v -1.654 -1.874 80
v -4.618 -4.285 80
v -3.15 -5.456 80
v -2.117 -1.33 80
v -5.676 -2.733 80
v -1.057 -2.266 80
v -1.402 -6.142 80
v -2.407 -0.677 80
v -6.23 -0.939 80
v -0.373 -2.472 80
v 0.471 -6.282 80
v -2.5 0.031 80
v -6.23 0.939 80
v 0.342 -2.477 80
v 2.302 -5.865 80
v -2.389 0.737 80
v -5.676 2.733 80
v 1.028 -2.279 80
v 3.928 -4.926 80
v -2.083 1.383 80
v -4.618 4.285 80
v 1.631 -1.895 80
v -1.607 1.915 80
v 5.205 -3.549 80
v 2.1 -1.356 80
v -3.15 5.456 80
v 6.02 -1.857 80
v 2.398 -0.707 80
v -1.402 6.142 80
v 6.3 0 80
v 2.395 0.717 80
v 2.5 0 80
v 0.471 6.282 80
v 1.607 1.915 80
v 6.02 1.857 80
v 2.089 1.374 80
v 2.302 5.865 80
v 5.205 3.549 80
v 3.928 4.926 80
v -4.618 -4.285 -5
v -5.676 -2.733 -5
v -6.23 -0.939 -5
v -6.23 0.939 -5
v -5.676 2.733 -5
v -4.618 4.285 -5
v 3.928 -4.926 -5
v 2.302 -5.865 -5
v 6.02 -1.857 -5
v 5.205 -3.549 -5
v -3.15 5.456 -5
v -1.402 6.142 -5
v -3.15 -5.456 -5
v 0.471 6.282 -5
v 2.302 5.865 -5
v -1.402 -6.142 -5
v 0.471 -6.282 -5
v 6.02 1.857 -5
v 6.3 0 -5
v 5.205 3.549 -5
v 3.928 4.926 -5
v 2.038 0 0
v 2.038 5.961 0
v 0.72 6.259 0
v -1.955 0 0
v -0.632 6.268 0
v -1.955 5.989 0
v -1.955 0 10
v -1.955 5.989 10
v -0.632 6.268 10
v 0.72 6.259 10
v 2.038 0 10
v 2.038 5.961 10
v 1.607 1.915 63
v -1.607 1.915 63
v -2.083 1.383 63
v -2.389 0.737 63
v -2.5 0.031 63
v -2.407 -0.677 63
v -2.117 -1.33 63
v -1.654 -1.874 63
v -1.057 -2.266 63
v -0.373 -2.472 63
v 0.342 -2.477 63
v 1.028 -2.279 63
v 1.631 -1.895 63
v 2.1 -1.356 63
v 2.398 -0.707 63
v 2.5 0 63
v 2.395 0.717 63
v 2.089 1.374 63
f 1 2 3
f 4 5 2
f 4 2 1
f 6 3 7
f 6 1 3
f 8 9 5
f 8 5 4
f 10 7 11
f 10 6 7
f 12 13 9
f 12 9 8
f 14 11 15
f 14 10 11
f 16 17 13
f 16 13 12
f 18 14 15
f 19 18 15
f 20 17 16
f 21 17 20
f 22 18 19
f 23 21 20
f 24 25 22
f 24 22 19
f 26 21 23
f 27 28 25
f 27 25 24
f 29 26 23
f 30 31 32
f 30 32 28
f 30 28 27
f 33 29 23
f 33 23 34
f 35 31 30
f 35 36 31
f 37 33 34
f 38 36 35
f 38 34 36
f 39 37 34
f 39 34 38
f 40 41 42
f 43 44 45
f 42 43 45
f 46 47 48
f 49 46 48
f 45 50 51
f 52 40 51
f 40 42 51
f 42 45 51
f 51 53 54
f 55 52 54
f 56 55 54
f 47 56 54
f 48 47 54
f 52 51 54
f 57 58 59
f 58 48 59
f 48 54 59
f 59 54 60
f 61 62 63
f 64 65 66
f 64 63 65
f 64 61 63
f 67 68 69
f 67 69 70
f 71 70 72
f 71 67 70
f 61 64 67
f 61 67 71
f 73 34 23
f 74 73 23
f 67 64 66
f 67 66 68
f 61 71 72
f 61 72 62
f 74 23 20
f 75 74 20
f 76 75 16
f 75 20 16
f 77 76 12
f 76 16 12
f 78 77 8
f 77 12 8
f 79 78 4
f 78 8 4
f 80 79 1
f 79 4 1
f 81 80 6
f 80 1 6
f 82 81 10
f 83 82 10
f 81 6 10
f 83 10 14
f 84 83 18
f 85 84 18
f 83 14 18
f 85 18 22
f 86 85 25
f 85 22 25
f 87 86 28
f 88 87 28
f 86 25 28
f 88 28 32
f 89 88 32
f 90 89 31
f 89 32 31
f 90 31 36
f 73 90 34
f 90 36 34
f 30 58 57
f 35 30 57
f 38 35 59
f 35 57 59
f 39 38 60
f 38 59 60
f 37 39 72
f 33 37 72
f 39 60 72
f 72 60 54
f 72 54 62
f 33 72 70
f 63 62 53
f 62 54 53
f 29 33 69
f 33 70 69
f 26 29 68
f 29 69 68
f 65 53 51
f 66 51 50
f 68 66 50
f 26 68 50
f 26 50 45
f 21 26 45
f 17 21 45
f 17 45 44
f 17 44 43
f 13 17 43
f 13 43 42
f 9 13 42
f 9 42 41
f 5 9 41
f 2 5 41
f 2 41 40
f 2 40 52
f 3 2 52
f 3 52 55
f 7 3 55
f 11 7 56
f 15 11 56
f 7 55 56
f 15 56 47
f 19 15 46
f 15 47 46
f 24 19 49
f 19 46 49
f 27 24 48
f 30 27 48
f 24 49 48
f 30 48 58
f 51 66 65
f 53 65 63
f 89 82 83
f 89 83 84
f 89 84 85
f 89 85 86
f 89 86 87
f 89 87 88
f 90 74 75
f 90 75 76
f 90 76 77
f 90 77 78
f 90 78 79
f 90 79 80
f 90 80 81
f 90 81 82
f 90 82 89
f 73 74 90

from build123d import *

# Parameters (mm, degrees)
BOSS_EXTRUDE1_DEPTH      = 80
BOSS_EXTRUDE1_DEPTH_BACK = 5
SKETCH1_R                = 6.3
CUT_EXTRUDE1_DEPTH       = 10
CUT_EXTRUDE3_DEPTH       = 17


with BuildPart() as part:
    # Sketch1 → Boss-Extrude1 (new, two sides: drawn at the far end of the back side and taken through both)
    with BuildSketch(Plane.XY.offset(-BOSS_EXTRUDE1_DEPTH_BACK)):
        Circle(SKETCH1_R)
    extrude(amount=BOSS_EXTRUDE1_DEPTH + BOSS_EXTRUDE1_DEPTH_BACK)

    # Sketch6 → Cut-Extrude1 (cut)
    with BuildSketch(Plane(origin=(0, 0, 0), x_dir=(1, 0, 0), z_dir=(0, 1, 0))):
        Polygon((0, 0), (-1.955160092, 0), (-1.955160092, -10), (2.038358394, -10), (2.038358394, 0), align=None)
    extrude(amount=CUT_EXTRUDE1_DEPTH, mode=Mode.SUBTRACT)

    # Sketch7 → Cut-Extrude3 (cut)
    with BuildSketch(Plane.XY.offset(80)):
        with BuildLine():
            Line((1.60670282, 1.915334448), (0, 1.915334448))
            Line((0, 1.915334448), (-1.60670282, 1.915334448))
            ThreePointArc((-1.60670282, 1.915334448), (-1.056703116, -2.265696035), (2.5, 0))
            ThreePointArc((2.5, 0), (2.265696035, 1.056703116), (1.60670282, 1.915334448))
        make_face()
    extrude(amount=-CUT_EXTRUDE3_DEPTH, mode=Mode.SUBTRACT)


solid = part.part
